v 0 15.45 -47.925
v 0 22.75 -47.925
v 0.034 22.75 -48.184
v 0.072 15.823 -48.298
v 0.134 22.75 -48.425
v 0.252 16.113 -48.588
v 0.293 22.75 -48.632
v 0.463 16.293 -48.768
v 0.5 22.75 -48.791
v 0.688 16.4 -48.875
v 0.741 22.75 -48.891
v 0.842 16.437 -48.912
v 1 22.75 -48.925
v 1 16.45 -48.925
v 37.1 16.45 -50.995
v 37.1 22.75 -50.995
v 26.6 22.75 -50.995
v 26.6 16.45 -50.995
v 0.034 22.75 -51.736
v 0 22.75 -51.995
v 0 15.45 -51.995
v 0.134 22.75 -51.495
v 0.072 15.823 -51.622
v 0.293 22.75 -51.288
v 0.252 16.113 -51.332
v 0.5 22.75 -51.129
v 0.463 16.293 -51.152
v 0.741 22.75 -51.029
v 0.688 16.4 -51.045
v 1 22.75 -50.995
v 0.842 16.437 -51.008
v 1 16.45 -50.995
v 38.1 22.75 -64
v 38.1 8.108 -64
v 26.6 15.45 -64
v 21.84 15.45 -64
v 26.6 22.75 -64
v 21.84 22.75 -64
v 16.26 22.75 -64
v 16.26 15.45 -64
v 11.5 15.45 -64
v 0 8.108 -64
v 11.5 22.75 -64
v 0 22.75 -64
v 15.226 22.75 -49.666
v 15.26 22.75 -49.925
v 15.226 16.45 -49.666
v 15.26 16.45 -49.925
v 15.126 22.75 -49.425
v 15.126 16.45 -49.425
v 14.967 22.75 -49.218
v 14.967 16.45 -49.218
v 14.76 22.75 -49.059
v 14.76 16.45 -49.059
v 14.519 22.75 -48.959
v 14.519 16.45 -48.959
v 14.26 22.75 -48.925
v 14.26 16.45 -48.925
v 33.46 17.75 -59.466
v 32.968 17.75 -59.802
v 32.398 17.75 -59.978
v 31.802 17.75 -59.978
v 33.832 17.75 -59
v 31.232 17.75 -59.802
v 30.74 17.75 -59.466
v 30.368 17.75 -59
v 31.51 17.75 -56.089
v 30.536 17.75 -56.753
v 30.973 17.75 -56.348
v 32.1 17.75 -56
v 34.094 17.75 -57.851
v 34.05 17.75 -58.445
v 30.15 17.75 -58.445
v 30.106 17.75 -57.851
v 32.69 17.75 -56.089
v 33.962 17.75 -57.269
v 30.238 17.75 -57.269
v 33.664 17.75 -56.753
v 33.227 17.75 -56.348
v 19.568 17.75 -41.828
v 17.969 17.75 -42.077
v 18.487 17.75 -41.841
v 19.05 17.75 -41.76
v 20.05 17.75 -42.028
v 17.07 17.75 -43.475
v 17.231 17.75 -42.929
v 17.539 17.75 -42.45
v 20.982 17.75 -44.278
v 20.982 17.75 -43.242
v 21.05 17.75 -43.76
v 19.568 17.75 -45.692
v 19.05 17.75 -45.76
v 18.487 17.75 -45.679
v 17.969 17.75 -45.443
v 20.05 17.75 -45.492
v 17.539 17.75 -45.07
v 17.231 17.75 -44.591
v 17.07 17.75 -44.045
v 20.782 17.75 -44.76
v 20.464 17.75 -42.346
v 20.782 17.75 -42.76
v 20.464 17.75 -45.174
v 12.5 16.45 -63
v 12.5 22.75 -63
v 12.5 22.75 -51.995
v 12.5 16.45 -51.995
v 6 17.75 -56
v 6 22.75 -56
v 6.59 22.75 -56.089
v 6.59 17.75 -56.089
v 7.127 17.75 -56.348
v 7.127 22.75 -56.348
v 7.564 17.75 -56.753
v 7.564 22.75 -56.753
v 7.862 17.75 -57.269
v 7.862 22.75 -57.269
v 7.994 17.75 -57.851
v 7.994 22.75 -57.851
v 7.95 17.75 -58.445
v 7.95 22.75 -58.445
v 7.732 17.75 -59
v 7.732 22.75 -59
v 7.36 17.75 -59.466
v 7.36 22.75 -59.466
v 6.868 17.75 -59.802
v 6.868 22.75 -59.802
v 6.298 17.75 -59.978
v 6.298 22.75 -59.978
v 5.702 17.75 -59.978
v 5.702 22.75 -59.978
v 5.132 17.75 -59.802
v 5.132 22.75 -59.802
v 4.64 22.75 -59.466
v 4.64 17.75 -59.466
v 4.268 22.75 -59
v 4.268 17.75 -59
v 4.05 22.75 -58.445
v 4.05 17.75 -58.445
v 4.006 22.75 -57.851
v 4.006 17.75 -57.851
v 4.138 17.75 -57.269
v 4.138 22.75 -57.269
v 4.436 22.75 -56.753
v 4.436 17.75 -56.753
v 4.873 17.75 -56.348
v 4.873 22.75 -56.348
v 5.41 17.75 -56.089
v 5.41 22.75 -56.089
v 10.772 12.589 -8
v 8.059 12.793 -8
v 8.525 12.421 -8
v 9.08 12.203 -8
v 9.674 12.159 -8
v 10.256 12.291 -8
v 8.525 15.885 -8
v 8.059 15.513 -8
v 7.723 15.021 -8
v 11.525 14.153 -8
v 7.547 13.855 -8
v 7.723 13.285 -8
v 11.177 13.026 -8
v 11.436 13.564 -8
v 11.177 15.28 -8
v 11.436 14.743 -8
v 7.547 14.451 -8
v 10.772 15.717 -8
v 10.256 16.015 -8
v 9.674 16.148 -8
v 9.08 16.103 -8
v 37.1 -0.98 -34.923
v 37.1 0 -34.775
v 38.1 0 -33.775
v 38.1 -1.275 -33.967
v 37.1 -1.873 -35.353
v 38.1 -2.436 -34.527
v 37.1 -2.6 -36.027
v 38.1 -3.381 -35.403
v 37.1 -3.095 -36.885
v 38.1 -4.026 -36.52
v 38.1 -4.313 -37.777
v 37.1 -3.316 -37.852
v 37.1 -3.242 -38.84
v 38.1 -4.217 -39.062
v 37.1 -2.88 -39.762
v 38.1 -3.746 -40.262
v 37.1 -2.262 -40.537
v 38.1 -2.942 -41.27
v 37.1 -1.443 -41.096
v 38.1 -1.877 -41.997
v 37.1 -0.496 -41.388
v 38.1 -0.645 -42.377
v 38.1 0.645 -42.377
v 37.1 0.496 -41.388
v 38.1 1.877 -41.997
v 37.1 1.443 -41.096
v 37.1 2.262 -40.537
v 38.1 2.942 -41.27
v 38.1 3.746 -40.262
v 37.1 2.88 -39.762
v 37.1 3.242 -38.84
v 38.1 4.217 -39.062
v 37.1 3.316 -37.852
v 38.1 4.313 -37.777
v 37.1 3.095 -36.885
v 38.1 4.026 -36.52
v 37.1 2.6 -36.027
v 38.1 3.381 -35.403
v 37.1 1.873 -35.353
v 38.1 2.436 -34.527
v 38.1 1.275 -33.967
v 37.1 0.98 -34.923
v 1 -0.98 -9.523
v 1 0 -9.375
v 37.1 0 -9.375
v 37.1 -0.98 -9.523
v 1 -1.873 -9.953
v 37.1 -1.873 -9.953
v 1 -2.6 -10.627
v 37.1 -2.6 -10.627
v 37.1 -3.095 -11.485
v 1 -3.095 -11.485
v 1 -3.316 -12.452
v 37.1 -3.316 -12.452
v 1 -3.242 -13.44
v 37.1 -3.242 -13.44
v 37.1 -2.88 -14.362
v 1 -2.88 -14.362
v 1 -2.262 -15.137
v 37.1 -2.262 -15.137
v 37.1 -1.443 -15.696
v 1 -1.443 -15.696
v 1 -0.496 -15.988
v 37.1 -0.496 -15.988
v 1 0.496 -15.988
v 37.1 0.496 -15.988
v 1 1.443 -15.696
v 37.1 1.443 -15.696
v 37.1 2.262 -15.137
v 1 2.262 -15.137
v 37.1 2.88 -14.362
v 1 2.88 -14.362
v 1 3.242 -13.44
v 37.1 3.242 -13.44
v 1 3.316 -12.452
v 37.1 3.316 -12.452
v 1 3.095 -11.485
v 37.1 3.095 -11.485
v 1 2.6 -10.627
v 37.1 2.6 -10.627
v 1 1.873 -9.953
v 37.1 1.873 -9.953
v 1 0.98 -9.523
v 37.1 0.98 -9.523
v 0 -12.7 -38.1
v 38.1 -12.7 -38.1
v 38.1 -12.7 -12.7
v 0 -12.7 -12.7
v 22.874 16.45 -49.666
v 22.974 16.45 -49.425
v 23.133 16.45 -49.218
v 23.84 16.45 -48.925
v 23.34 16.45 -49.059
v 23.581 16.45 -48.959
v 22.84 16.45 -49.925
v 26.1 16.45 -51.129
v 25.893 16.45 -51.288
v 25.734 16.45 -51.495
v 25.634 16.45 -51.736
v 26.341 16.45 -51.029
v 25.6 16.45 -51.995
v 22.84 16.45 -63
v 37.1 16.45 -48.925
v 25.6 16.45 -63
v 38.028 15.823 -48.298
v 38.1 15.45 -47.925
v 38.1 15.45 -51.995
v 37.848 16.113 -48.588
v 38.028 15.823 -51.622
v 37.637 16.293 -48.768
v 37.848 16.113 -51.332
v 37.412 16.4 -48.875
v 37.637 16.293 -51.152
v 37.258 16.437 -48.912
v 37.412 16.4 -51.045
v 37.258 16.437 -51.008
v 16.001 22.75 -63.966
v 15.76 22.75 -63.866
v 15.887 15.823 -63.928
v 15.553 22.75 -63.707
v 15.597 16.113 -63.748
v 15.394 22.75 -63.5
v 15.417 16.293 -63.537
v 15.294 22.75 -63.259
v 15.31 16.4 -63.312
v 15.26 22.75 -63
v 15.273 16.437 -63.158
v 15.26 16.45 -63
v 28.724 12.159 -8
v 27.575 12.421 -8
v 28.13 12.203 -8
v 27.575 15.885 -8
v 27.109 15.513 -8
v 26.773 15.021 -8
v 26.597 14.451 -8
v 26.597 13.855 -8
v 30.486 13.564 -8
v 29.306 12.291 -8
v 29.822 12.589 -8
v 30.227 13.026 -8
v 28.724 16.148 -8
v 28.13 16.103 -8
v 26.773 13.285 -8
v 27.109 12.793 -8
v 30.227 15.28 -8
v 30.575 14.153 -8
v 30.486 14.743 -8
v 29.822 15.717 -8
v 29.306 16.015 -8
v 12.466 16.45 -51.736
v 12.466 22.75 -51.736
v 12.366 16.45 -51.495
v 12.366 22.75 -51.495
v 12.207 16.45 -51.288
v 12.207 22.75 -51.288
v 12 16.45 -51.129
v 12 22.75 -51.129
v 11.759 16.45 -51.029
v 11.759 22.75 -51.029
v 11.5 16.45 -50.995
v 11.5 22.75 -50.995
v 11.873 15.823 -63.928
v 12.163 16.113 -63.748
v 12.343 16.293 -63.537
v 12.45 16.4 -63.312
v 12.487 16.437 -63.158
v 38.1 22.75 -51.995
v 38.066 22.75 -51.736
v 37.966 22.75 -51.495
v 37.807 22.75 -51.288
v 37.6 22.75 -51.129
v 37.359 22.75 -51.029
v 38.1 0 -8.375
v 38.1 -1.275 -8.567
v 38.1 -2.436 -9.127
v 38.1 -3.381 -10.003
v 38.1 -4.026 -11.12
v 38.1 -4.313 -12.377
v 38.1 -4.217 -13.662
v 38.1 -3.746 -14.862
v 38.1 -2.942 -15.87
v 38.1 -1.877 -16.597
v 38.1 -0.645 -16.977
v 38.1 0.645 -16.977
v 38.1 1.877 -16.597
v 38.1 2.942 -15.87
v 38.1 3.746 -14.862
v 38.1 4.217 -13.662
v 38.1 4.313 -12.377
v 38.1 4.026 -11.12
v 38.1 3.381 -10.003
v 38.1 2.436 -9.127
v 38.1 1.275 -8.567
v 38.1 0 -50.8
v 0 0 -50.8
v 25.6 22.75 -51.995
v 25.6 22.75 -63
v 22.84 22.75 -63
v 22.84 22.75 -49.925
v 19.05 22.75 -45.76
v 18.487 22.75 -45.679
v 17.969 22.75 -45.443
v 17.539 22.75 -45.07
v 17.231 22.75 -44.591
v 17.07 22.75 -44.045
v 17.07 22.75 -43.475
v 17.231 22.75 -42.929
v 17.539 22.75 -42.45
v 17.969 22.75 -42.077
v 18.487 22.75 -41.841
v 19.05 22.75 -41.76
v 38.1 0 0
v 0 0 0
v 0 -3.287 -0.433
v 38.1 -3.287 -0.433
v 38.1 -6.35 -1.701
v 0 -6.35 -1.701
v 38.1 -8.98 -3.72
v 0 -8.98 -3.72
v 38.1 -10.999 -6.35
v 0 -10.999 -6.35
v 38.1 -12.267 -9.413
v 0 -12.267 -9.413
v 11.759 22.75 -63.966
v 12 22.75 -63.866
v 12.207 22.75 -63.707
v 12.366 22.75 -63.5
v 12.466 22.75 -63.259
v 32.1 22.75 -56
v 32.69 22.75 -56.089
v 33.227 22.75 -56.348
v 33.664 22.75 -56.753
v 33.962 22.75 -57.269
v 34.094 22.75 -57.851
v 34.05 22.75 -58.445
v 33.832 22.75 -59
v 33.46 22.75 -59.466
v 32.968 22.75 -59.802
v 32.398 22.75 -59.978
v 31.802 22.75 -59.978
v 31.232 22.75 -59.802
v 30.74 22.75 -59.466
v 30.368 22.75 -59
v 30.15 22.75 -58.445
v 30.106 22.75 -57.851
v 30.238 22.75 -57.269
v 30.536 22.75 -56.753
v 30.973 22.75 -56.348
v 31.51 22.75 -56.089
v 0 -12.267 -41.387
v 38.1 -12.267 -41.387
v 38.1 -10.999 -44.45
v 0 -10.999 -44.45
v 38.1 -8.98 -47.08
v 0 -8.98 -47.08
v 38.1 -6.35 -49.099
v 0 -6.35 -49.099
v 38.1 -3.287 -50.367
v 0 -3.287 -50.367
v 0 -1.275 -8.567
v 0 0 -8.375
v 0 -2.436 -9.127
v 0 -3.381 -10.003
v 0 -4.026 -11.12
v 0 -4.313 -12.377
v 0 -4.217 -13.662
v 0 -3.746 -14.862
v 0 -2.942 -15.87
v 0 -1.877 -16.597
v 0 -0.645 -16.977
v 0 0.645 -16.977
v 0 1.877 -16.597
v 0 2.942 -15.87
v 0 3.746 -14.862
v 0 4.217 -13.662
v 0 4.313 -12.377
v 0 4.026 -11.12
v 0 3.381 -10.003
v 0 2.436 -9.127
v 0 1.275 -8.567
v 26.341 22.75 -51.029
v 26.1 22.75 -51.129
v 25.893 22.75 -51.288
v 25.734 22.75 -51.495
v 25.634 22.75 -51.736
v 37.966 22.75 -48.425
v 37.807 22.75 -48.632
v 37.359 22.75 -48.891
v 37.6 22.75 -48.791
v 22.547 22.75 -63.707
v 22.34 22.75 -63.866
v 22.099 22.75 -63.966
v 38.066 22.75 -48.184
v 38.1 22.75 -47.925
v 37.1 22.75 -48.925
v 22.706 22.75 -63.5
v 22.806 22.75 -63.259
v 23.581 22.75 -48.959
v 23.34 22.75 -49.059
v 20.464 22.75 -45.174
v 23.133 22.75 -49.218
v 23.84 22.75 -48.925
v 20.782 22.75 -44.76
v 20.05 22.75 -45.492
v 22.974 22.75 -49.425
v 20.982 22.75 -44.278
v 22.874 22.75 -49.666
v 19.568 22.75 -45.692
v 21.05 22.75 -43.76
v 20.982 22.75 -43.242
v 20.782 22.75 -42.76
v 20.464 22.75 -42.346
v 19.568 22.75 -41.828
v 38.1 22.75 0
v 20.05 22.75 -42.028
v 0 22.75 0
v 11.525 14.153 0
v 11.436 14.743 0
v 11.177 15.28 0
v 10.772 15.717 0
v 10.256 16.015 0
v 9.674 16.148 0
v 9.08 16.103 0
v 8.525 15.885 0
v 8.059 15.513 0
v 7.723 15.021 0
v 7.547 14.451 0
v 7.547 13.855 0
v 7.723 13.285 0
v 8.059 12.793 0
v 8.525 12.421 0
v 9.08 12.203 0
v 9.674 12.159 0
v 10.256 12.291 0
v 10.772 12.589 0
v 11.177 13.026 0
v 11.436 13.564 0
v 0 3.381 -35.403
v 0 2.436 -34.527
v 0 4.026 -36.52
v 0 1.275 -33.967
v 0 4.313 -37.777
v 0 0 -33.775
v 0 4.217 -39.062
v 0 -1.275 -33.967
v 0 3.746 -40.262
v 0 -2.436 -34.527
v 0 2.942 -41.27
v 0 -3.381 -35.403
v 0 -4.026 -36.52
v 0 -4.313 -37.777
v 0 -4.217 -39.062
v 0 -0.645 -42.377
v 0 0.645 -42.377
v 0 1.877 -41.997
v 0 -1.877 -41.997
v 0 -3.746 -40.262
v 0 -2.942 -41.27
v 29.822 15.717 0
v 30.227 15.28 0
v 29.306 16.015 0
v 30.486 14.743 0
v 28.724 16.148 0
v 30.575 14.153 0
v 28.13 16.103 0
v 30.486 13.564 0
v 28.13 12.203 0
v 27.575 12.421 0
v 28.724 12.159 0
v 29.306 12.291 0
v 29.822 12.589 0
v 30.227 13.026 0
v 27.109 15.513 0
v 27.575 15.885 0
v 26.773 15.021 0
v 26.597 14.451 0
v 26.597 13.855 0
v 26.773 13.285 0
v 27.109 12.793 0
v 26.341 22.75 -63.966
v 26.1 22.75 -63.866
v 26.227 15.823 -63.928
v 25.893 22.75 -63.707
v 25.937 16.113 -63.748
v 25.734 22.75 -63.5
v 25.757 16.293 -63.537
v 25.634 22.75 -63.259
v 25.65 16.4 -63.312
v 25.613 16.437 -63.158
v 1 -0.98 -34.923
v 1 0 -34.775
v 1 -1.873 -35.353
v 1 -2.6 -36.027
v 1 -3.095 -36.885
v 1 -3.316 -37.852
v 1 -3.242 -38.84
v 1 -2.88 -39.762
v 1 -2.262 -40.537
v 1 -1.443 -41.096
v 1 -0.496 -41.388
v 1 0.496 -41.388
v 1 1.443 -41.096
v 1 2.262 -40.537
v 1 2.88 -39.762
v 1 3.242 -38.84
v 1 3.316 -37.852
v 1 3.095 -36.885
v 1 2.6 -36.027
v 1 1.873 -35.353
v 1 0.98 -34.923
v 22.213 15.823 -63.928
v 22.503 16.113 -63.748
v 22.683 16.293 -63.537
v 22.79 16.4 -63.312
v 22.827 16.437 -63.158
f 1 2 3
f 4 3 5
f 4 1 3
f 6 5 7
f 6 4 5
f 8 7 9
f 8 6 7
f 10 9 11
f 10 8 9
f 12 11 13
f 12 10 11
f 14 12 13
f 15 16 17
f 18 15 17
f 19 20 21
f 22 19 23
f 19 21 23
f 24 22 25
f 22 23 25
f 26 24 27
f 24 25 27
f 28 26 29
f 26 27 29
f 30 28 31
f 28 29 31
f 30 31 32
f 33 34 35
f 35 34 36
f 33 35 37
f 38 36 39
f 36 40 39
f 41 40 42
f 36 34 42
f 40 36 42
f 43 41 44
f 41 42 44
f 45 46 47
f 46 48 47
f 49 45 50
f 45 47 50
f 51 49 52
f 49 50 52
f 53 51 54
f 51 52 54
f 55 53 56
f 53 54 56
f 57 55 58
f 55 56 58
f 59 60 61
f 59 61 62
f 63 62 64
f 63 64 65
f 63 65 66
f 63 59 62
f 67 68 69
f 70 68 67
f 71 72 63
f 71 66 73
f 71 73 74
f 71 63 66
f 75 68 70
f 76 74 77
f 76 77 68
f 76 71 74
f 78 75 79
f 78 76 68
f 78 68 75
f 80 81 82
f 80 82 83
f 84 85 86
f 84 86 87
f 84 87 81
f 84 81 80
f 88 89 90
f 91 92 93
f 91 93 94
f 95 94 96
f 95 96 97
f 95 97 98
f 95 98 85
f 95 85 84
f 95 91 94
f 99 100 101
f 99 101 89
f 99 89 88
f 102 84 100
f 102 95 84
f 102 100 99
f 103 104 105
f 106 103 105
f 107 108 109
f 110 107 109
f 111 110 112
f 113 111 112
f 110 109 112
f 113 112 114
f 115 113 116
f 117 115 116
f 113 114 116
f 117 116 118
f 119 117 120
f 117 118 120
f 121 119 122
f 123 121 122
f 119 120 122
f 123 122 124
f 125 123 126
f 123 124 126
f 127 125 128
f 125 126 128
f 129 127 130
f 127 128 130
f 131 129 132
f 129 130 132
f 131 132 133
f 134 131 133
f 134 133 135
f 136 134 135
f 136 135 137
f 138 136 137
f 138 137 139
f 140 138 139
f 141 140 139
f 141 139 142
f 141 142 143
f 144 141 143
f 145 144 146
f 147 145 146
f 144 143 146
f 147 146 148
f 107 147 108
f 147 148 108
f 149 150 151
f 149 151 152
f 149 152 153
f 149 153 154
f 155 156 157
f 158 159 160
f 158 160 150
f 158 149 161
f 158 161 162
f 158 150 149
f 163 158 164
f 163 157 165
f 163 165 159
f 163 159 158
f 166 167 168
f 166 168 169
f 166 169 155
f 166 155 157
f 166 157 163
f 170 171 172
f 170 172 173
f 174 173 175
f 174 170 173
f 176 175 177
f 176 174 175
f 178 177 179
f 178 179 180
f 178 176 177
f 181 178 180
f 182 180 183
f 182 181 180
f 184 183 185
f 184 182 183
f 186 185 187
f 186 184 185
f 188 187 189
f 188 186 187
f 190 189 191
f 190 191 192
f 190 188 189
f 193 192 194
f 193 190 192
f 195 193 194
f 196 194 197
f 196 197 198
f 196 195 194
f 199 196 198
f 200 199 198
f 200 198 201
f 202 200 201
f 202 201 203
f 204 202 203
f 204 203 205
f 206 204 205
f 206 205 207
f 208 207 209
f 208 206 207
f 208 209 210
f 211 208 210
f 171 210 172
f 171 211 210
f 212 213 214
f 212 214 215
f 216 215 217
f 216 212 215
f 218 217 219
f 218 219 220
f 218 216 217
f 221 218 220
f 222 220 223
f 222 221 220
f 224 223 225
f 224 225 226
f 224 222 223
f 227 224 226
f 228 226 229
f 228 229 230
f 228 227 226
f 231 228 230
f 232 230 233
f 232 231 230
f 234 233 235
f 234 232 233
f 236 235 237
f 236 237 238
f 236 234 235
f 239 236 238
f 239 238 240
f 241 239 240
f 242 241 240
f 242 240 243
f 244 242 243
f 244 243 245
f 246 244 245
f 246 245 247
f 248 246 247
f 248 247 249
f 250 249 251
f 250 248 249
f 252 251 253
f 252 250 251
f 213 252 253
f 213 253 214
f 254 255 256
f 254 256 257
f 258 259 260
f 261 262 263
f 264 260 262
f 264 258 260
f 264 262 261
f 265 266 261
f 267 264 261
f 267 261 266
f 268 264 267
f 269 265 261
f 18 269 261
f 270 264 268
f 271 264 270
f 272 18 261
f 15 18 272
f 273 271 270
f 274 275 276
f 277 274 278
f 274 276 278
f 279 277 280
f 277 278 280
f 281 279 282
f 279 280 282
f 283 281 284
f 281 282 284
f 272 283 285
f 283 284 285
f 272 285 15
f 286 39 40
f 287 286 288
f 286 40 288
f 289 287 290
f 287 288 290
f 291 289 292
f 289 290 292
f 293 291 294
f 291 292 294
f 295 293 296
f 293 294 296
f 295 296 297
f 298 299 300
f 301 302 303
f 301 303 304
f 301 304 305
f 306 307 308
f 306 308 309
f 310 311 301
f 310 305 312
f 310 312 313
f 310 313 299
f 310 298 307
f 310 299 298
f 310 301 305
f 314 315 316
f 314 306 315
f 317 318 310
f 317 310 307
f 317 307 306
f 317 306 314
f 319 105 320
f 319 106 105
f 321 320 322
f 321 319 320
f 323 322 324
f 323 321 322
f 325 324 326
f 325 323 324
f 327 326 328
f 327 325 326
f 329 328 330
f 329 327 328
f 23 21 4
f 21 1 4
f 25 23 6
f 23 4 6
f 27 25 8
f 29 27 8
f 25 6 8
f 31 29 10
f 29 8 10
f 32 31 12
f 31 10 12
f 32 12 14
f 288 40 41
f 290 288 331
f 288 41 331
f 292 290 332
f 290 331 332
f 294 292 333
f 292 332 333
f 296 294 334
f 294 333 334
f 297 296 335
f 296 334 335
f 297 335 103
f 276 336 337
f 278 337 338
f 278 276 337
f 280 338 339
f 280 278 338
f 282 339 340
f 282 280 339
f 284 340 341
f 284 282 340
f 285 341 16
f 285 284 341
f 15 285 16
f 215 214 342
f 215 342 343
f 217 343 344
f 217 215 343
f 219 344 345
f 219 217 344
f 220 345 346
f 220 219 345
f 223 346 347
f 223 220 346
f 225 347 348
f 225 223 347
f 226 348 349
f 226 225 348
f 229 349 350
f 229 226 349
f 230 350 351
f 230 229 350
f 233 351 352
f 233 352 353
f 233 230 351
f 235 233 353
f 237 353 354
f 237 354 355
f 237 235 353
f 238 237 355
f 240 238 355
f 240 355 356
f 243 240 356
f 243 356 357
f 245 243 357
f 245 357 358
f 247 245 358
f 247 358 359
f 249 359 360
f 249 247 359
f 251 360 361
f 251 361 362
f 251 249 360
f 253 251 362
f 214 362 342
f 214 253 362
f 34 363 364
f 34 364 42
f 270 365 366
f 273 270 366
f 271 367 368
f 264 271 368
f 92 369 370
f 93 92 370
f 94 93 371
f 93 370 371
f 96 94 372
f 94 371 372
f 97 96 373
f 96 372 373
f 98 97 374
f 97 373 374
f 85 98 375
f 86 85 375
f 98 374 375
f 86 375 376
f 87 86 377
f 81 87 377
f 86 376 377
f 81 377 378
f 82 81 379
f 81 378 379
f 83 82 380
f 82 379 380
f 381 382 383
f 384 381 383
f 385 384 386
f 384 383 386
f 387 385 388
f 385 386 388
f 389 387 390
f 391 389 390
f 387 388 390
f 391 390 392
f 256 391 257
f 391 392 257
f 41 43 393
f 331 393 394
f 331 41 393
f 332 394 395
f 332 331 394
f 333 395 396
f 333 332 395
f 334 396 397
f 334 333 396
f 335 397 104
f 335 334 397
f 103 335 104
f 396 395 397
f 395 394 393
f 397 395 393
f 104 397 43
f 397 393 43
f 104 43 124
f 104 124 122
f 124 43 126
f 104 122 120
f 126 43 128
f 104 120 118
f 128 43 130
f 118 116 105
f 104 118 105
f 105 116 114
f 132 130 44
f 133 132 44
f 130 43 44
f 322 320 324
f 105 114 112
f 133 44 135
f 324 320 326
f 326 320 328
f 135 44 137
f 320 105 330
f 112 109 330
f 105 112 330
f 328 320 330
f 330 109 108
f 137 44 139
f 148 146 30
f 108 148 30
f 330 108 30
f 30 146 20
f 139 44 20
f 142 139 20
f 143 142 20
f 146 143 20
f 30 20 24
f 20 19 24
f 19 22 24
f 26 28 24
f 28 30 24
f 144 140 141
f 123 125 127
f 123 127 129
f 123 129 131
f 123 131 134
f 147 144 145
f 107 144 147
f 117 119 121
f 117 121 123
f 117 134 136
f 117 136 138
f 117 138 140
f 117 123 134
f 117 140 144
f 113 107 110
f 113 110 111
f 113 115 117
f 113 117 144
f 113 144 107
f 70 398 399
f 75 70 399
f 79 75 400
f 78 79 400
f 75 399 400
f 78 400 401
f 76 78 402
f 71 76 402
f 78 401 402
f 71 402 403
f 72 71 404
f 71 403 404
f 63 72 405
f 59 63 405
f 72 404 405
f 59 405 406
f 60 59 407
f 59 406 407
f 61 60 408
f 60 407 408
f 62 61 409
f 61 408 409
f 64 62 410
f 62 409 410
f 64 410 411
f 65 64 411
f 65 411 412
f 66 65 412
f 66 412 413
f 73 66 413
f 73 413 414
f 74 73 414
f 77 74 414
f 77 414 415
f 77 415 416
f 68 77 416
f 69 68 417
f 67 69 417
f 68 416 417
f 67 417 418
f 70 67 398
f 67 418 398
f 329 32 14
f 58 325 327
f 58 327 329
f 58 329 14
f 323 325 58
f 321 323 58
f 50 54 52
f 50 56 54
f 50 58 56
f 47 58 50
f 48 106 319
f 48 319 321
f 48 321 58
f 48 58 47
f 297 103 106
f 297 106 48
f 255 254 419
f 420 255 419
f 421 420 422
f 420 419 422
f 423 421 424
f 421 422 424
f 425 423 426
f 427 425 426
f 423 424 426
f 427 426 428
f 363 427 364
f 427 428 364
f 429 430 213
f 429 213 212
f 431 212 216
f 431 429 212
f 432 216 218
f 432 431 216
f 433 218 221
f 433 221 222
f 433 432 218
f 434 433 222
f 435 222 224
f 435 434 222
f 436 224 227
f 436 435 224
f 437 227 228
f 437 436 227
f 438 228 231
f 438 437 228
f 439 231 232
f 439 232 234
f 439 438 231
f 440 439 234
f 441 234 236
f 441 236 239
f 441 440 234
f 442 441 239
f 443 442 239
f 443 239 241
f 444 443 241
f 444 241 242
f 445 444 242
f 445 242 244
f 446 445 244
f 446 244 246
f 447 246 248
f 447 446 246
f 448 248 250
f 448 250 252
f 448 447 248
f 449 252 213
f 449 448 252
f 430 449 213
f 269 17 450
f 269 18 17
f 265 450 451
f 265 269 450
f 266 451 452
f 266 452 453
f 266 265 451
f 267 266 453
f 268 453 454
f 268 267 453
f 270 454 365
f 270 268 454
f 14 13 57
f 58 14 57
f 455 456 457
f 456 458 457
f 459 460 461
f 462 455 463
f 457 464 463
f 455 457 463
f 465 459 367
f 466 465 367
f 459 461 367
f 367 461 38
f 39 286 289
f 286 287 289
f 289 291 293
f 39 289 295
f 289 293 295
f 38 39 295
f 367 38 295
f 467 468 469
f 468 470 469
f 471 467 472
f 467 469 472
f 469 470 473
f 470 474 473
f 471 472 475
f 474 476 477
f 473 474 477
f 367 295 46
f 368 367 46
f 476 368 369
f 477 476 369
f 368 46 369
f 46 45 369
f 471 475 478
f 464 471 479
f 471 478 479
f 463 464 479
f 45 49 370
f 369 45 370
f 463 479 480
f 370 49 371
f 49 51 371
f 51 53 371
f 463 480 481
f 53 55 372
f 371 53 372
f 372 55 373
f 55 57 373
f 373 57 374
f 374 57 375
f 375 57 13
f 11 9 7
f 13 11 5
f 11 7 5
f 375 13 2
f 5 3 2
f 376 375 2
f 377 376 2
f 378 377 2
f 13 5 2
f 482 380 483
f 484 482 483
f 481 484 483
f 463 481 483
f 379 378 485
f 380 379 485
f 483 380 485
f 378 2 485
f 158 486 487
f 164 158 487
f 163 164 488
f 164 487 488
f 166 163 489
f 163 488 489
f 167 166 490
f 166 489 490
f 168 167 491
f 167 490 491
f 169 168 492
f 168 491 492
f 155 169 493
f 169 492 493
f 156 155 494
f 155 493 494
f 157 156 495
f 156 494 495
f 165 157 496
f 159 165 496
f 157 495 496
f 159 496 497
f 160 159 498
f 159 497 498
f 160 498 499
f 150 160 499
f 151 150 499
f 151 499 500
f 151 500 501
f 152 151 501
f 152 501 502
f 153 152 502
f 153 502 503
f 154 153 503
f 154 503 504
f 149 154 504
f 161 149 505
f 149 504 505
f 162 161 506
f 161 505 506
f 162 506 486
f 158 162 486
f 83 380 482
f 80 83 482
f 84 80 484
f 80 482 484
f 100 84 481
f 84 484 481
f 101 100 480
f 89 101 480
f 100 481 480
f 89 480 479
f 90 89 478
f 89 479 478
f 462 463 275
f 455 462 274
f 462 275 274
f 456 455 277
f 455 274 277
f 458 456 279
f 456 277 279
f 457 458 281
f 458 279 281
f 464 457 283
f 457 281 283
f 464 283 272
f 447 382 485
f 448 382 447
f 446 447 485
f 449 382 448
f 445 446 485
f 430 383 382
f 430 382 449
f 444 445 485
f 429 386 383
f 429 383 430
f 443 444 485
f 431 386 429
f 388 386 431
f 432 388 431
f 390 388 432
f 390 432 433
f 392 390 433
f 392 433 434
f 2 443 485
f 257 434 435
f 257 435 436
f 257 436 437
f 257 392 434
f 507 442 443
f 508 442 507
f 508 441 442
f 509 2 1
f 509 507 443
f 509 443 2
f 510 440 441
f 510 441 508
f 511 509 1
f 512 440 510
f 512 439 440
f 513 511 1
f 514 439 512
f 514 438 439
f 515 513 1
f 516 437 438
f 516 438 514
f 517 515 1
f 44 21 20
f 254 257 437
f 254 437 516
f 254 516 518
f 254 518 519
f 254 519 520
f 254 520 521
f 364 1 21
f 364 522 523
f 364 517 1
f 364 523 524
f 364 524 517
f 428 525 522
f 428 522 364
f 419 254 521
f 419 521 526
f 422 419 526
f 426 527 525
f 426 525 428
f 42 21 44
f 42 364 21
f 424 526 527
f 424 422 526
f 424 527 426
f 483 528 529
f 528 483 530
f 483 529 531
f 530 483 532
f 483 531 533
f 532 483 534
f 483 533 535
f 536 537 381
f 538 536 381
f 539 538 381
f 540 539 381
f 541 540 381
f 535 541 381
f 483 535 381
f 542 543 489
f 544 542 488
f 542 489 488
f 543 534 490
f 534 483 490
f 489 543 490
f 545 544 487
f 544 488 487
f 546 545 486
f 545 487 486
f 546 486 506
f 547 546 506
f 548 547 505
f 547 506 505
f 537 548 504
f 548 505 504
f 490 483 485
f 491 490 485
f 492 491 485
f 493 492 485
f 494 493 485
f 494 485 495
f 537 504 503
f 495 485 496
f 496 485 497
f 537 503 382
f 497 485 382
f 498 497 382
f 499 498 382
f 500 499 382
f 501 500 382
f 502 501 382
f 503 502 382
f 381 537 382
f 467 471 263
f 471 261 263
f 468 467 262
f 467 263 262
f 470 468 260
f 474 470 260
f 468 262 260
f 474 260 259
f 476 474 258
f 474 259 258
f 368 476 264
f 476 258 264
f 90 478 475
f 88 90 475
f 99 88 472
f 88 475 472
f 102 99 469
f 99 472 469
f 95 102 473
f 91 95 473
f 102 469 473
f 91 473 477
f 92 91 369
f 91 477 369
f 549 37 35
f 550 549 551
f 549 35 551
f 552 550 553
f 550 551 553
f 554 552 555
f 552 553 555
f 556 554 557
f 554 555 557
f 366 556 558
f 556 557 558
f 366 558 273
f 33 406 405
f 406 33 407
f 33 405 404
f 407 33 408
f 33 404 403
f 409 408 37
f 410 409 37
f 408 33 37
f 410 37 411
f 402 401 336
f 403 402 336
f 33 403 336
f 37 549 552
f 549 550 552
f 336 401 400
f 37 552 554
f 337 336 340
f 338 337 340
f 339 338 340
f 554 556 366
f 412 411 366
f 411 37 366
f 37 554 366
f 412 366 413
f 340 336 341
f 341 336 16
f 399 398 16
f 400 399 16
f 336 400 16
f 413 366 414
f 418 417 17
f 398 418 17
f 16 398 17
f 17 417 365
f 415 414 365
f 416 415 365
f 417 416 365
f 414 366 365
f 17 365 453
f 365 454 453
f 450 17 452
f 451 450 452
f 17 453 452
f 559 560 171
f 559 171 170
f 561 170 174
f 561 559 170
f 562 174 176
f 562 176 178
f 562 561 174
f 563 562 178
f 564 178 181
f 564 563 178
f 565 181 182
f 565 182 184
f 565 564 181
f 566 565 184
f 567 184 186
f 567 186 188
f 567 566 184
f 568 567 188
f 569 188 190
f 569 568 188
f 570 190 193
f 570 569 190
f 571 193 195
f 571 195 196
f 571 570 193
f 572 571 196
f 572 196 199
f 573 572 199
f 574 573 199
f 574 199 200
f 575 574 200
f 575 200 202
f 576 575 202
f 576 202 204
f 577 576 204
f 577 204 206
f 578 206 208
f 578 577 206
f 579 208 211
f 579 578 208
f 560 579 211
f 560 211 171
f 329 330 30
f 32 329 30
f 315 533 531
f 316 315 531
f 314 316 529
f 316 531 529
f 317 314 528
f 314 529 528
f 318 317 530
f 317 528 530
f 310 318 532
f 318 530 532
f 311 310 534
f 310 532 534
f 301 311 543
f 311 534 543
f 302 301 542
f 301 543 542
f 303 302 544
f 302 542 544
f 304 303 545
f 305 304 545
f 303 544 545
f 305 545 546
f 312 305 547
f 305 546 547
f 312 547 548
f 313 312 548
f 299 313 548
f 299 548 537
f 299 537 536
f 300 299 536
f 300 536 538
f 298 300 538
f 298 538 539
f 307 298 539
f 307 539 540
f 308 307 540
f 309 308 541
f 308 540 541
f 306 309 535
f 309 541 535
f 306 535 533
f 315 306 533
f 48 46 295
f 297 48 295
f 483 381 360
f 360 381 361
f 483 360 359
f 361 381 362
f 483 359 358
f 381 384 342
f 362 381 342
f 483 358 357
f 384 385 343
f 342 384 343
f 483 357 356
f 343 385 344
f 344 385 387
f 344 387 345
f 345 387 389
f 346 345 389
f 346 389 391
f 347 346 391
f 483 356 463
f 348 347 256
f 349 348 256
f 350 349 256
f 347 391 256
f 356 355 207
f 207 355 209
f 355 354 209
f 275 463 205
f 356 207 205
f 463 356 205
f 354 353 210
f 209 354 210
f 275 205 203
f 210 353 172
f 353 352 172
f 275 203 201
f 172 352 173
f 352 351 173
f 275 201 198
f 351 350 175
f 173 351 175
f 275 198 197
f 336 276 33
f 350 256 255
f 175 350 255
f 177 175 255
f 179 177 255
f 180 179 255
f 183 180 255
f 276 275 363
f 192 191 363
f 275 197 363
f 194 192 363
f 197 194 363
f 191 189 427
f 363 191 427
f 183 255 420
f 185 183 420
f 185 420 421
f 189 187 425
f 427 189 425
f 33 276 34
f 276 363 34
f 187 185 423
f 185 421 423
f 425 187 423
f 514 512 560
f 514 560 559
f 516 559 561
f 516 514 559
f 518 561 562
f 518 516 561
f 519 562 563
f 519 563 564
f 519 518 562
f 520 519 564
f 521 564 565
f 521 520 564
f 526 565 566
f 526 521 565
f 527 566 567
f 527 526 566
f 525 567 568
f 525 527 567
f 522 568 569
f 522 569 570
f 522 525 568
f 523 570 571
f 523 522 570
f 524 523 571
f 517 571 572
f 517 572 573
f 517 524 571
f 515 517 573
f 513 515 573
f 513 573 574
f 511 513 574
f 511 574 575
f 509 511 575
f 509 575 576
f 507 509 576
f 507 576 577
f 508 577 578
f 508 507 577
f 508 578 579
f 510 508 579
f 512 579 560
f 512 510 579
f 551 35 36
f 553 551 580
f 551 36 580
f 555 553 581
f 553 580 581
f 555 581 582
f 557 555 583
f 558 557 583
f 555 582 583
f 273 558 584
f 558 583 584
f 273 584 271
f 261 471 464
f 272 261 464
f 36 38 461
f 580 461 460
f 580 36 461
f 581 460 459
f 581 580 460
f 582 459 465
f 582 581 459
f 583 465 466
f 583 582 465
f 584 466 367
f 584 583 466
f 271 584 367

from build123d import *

# Parameters (mm, degrees)
SKETCH1_R           = 3.325
BOSS_EXTRUDE2_DEPTH = 38.1
BOSS_EXTRUDE3_REACH = 84.488
SKETCH6_W           = 38.1
SKETCH6_H           = 25.4
SKETCH10_R          = 2
CUT_EXTRUDE6_DEPTH  = 8
CHAMFER1_SIZE       = 1
CUT_EXTRUDE9_DEPTH  = 6.3
FILLET3_R           = 1
SKETCH16_R          = 2
CUT_EXTRUDE10_DEPTH = 5


with BuildPart() as part:
    # Sketch1 → Boss-Extrude2 (new body)
    with BuildSketch(Plane(origin=(0, 0, 0), x_dir=(0, 0, -1), z_dir=(1, 0, 0))):
        with BuildLine():
            Line((0, 22.75), (0, 0))
            ThreePointArc((0, 0), (12.7, -12.7), (25.4, 0))
            ThreePointArc((25.4, 0), (38.1, -12.7), (50.8, 0))
            Line((50.8, 0), (64, 8.107573416))
            Line((64, 8.107573416), (64, 22.75))
            Line((64, 22.75), (0, 22.75))
        make_face()
        with Locations(Location((38.1, 0, 0), (0, 0, 180))):
            Circle(SKETCH1_R, mode=Mode.SUBTRACT)
        with Locations(Location((12.7, 0, 0), (0, 0, 180))):
            Circle(SKETCH1_R, mode=Mode.SUBTRACT)
    extrude(amount=BOSS_EXTRUDE2_DEPTH)

    # Sketch6 → Boss-Extrude3 (add, up to next)
    with BuildSketch(Plane(origin=(0, -12.7, 0), x_dir=(-1, 0, 0), z_dir=(0, -1, 0)), mode=Mode.PRIVATE) as boss_extrude3_sk1:
        with Locations((-19.05, 25.4)):
            Rectangle(SKETCH6_W, SKETCH6_H)
    boss_extrude3_tool1 = extrude(boss_extrude3_sk1.sketch, amount=-BOSS_EXTRUDE3_REACH, mode=Mode.PRIVATE) - part.part
    add(boss_extrude3_tool1.solids().sort_by_distance((19.05, -12.7, -25.4))[0])

    # Sketch10 → Cut-Extrude6 (cut)
    with BuildSketch(Plane.XY):
        with Locations((9.525, 14.153125)):
            Circle(SKETCH10_R)
        with Locations((28.575, 14.153125)):
            Circle(SKETCH10_R)
    extrude(amount=-CUT_EXTRUDE6_DEPTH, mode=Mode.SUBTRACT)

    # Chamfer1
    chamfer1_edges = [part.edges().sort_by_distance(p)[0] for p in [
        (0, 0, -16.025),
        (0, 0, -41.425),
        (38.1, 0, -41.425),
        (38.1, 0, -16.025),
    ]]
    chamfer(chamfer1_edges, length=CHAMFER1_SIZE)

    # Sketch15 → Cut-Extrude9 (cut)
    with BuildSketch(Plane(origin=(0, 22.75, 0), x_dir=(1, 0, 0), z_dir=(0, 1, 0))):
        Polygon((12.5, 50.995), (0, 50.995), (0, 48.925), (15.26, 48.925), (15.26, 64), (12.5, 64), align=None)
        Polygon((25.6, 64), (22.84, 64), (22.84, 48.925), (38.1, 48.925), (38.1, 50.995), (25.6, 50.995), align=None)
    extrude(amount=-CUT_EXTRUDE9_DEPTH, mode=Mode.SUBTRACT)

    # Fillet3
    fillet3_edges = [part.edges().sort_by_distance(p)[0] for p in [
        (15.26, 19.6, -48.925),
        (0, 16.45, -49.96),
        (0, 19.6, -48.925),
        (0, 19.6, -50.995),
        (12.5, 19.6, -50.995),
        (13.88, 16.45, -64),
        (12.5, 19.6, -64),
        (15.26, 19.6, -64),
        (38.1, 16.45, -49.96),
        (38.1, 19.6, -50.995),
        (38.1, 19.6, -48.925),
        (22.84, 19.6, -48.925),
        (24.22, 16.45, -64),
        (22.84, 19.6, -64),
        (25.6, 19.6, -64),
        (25.6, 19.6, -50.995),
    ]]
    fillet(fillet3_edges, radius=FILLET3_R)

    # Sketch16 → Cut-Extrude10 (cut)
    with BuildSketch(Plane(origin=(0, 22.75, 0), x_dir=(1, 0, 0), z_dir=(0, 1, 0))):
        with Locations(Location((32.1, 58, 0), (0, 0, 270))):
            Circle(SKETCH16_R)
        with BuildLine():
            ThreePointArc((21.05, 43.76), (20.464213562, 45.174213562), (19.05, 45.76))
            Line((19.05, 45.76), (19.05, 41.76))
            ThreePointArc((19.05, 41.76), (20.464213562, 42.345786438), (21.05, 43.76))
        make_face()
        with BuildLine():
            Line((19.05, 41.76), (19.05, 45.76))
            ThreePointArc((19.05, 45.76), (17.05, 43.76), (19.05, 41.76))
        make_face()
        with Locations(Location((6, 58, 0), (0, 0, 270))):
            Circle(SKETCH16_R)
    extrude(amount=-CUT_EXTRUDE10_DEPTH, mode=Mode.SUBTRACT)


solid = part.part
